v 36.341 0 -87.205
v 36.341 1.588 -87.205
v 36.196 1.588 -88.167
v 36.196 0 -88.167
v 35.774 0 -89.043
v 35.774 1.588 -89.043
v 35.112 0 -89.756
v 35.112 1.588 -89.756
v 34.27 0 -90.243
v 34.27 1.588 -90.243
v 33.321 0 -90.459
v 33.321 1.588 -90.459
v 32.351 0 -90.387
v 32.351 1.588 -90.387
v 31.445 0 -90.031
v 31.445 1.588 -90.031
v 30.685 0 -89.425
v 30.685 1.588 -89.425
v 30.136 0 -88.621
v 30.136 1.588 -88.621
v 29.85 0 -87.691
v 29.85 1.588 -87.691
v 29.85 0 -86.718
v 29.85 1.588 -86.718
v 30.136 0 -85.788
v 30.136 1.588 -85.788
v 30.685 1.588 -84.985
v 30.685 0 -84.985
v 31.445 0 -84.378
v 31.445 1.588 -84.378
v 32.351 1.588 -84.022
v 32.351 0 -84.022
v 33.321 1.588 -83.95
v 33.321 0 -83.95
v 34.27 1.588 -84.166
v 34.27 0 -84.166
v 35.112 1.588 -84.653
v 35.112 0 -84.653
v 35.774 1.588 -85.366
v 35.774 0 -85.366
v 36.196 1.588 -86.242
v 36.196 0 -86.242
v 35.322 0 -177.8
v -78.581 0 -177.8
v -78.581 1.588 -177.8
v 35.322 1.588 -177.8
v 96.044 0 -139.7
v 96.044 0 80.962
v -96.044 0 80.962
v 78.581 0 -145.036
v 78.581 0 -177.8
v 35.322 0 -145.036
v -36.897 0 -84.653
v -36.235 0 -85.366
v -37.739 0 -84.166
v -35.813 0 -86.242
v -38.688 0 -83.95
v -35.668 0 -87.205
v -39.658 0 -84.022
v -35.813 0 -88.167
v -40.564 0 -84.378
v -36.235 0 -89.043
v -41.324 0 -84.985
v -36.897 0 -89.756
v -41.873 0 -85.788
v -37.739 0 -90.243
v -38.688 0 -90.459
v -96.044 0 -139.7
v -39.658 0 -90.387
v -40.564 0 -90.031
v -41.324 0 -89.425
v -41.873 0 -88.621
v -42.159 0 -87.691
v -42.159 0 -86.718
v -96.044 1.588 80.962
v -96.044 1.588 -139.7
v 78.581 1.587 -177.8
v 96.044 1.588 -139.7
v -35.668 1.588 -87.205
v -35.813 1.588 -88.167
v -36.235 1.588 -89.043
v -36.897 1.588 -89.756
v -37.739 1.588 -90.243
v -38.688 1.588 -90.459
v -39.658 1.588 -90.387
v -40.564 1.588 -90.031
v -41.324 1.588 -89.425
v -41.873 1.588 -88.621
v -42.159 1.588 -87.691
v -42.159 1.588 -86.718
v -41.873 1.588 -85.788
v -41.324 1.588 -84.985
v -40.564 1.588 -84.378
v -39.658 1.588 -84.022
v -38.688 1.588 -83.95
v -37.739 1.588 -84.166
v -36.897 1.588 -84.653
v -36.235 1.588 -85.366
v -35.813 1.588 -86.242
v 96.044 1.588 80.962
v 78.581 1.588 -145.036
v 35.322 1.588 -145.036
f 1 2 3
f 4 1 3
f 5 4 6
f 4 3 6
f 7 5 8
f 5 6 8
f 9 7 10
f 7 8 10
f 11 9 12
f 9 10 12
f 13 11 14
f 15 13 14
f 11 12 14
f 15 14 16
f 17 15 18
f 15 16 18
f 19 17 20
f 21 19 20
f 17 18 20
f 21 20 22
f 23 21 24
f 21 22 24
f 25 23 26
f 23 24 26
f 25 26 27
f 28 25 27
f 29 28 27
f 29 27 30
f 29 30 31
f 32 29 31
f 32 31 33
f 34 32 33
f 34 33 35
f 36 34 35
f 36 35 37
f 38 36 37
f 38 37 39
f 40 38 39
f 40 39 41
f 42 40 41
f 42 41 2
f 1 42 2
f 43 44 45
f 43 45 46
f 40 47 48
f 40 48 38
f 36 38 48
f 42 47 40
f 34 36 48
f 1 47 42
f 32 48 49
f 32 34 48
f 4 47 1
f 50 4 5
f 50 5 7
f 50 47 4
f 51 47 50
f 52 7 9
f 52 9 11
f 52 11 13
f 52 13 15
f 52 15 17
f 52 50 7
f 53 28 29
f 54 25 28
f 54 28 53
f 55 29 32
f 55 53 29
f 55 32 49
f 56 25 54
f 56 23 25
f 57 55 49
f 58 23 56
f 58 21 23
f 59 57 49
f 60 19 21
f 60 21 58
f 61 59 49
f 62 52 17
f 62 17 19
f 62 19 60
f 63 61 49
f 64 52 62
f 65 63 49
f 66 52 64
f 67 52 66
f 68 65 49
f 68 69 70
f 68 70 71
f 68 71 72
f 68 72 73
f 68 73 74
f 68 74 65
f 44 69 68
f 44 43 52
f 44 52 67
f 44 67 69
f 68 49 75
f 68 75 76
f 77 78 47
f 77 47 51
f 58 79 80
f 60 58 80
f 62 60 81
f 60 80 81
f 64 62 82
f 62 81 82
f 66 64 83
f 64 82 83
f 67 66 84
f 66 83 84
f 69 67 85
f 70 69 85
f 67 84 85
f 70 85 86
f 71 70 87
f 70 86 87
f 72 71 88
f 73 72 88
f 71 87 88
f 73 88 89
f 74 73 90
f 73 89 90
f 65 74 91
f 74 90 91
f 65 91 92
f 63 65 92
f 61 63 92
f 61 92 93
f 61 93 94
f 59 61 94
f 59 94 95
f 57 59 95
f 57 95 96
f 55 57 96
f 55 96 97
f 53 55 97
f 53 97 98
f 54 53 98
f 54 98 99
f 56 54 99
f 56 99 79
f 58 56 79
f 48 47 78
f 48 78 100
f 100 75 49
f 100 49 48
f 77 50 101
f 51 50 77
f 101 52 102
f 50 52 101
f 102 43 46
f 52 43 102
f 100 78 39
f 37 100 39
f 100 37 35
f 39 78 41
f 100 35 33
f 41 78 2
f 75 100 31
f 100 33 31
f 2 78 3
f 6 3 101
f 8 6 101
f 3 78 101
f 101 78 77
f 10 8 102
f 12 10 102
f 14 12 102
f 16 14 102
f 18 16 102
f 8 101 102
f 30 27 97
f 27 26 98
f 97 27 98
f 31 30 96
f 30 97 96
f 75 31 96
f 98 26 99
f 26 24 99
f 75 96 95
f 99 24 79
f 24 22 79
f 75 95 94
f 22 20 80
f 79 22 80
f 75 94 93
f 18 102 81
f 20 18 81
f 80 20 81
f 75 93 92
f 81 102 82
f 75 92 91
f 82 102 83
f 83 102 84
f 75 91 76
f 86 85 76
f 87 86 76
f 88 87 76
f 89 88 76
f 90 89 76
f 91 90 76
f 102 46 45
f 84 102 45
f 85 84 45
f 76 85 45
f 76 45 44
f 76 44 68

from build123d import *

# Parameters (mm, degrees)
BOSS_EXTRUDE1_DEPTH = 1.5875
SKETCH2_W           = 192.0875
SKETCH2_H           = 15.875
CUT_EXTRUDE1_DEPTH  = 1.5875
SKETCH4_R           = 3.2639
CUT_EXTRUDE2_DEPTH  = 9.906
SKETCH5_W           = 250.81556442
SKETCH5_H           = 138.767374129
CUT_EXTRUDE3_DEPTH  = 125.222


with BuildPart() as part:
    # Sketch1 → Boss-Extrude1 (new body)
    with BuildSketch(Plane(origin=(0, 0, 0), x_dir=(1, 0, 0), z_dir=(0, 1, 0))):
        Polygon((-96.04375, 177.8), (35.321875, 177.8), (35.321875, 145.036189145), (78.58125, 145.036189145), (78.58125, 177.8), (96.04375, 177.8), (96.04375, -177.8), (-96.04375, -177.8), align=None)
    extrude(amount=BOSS_EXTRUDE1_DEPTH)

    # Sketch2 → Cut-Extrude1 (cut)
    with BuildSketch(Plane(origin=(0, 1.5875, 0), x_dir=(1, 0, 0), z_dir=(0, 1, 0))):
        with Locations((0, -88.9)):
            Rectangle(SKETCH2_W, SKETCH2_H)
        Polygon((-78.58125, 177.8), (-96.04375, 139.7), (-96.04375, 177.8), align=None)
        Polygon((96.04375, 139.7), (78.58125, 177.8), (96.04375, 177.8), align=None)
    extrude(amount=-CUT_EXTRUDE1_DEPTH, mode=Mode.SUBTRACT)

    # Sketch4 → Cut-Extrude2 (cut)
    with BuildSketch(Plane(origin=(0, 1.5875, 0), x_dir=(1, 0, 0), z_dir=(0, 1, 0))):
        with Locations((33.07715, 87.20455)):
            Circle(SKETCH4_R)
        with Locations((-38.93185, 87.20455)):
            Circle(SKETCH4_R)
    extrude(amount=-CUT_EXTRUDE2_DEPTH, mode=Mode.SUBTRACT)

    # Sketch5 → Cut-Extrude3 (cut)
    with BuildSketch(Plane(origin=(0, 1.5875, 0), x_dir=(1, 0, 0), z_dir=(0, 1, 0))):
        with Locations((-21.956348657, -157.127502405)):
            Rectangle(SKETCH5_W, SKETCH5_H)
    extrude(amount=-CUT_EXTRUDE3_DEPTH, mode=Mode.SUBTRACT)


solid = part.part
